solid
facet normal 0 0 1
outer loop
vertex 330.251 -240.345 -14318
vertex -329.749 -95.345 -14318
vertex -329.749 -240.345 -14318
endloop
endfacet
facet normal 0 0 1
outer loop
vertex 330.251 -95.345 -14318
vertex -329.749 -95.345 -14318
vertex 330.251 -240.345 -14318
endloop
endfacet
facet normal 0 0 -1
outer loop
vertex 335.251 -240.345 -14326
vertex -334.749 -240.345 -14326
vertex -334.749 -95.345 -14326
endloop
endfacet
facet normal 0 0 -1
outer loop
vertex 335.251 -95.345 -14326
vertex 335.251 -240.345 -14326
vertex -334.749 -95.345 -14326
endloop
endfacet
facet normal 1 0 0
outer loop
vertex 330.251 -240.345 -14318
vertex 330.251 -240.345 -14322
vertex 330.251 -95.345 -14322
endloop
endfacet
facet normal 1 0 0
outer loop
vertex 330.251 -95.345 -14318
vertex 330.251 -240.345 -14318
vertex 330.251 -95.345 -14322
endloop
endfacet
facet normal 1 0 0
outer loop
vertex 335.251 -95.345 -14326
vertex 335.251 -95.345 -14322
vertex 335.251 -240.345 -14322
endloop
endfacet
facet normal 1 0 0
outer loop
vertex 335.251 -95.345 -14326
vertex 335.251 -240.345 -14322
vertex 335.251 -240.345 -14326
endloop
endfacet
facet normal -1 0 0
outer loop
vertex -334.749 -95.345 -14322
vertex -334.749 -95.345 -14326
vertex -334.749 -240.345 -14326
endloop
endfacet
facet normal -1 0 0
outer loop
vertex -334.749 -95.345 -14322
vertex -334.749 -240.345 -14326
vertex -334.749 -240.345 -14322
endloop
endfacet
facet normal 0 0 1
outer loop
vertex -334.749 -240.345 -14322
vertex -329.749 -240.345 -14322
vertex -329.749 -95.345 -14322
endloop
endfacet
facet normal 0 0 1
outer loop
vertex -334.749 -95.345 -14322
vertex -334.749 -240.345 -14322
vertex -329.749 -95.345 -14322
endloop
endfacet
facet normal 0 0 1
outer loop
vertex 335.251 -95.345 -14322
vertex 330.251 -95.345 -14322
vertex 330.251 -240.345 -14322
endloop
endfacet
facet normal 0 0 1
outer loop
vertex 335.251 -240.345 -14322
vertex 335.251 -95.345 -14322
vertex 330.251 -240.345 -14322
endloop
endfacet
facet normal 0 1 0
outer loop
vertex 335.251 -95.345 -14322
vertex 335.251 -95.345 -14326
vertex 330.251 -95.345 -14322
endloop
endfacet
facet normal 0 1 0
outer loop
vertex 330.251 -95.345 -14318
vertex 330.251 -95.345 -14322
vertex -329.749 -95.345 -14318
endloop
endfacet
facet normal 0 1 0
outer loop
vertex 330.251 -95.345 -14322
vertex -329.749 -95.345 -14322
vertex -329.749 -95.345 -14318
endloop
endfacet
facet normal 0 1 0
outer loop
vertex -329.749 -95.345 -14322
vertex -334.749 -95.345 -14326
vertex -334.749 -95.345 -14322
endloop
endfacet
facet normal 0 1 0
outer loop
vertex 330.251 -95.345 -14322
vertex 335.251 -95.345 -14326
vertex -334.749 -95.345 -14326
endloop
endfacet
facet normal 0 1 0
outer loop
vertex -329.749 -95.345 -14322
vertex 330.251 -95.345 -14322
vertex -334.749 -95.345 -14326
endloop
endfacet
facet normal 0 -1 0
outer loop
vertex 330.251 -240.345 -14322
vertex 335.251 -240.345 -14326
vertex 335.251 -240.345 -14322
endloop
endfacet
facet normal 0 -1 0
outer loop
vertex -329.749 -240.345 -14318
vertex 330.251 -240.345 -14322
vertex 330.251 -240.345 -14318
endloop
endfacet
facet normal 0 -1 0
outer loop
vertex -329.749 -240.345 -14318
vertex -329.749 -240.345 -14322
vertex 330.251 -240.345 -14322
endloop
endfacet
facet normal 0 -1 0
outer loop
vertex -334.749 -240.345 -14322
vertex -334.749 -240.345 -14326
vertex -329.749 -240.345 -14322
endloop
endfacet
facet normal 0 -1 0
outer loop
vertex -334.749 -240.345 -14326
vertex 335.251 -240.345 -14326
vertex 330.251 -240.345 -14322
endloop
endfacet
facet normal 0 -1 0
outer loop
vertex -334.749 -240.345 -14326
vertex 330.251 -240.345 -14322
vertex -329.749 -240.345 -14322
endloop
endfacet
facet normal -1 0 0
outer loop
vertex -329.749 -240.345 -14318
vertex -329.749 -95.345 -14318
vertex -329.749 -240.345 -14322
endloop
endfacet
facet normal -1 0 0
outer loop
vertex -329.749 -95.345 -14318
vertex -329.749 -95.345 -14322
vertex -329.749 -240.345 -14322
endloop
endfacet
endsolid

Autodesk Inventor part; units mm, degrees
ref_plane "YZ Plane" through (0, 0, 0) normal (1, 0, 0) x (0, 1, 0)
ref_plane "XZ Plane" through (0, 0, 0) normal (0, 1, 0) x (-1, 0, 0)
ref_plane "XY Plane" through (0, 0, 0) normal (0, 0, 1) x (1, 0, 0)
ref_plane "작업 평면1" through (0, -81.1446, -14326) normal (0, 0, 1) x (1, 0, 0)
sketch "스케치1" plane through (0, -81.1446, -14326) normal (0, 0, 1) x (1, 0, 0)
  line L0 (-329.749, -159.2005) -> (330.251, -159.2005)
  line L1 (330.251, -159.2005) -> (330.251, -14.2005)
  line L2 (330.251, -14.2005) -> (-329.749, -14.2005)
  line L3 (-329.749, -14.2005) -> (-329.749, -159.2005)
  point P0 (0, 81.1446)
  dimension "d0" = 660
  dimension "d1" = 145
extrude "돌출1" add sketch "스케치1" along normal blind 8
sketch "스케치3" plane through (-329.749, -240.3451, -14326) normal (-1, 0, 0) x (0, 0, 1)
  line L0 (0, 0) -> (0, 145) projected
  line L1 (0, 145) -> (8, 145) projected
  line L2 (0, 0) -> (4, 0)
  line L3 (4, 0) -> (4, 145)
  line L4 (4, 145) -> (0, 145)
  line L5 (0, 145) -> (0, 0)
  point P0 (14326, 240.3451)
extrude "돌출2" add sketch "스케치3" along normal blind 5
sketch "스케치4" plane through (330.251, -240.3451, -14326) normal (1, 0, 0) x (0, 0, -1)
  line L0 (0, 0) -> (0, 145) projected
  line L1 (0, 0) -> (-8, 0) projected
  line L2 (0, 145) -> (-4, 145)
  line L3 (-4, 145) -> (-4, 0)
  line L4 (-4, 0) -> (0, 0)
  line L5 (0, 0) -> (0, 145)
  point P0 (-14326, 240.3451)
extrude "돌출3" add sketch "스케치4" along normal blind 5
properties part number "slider"
